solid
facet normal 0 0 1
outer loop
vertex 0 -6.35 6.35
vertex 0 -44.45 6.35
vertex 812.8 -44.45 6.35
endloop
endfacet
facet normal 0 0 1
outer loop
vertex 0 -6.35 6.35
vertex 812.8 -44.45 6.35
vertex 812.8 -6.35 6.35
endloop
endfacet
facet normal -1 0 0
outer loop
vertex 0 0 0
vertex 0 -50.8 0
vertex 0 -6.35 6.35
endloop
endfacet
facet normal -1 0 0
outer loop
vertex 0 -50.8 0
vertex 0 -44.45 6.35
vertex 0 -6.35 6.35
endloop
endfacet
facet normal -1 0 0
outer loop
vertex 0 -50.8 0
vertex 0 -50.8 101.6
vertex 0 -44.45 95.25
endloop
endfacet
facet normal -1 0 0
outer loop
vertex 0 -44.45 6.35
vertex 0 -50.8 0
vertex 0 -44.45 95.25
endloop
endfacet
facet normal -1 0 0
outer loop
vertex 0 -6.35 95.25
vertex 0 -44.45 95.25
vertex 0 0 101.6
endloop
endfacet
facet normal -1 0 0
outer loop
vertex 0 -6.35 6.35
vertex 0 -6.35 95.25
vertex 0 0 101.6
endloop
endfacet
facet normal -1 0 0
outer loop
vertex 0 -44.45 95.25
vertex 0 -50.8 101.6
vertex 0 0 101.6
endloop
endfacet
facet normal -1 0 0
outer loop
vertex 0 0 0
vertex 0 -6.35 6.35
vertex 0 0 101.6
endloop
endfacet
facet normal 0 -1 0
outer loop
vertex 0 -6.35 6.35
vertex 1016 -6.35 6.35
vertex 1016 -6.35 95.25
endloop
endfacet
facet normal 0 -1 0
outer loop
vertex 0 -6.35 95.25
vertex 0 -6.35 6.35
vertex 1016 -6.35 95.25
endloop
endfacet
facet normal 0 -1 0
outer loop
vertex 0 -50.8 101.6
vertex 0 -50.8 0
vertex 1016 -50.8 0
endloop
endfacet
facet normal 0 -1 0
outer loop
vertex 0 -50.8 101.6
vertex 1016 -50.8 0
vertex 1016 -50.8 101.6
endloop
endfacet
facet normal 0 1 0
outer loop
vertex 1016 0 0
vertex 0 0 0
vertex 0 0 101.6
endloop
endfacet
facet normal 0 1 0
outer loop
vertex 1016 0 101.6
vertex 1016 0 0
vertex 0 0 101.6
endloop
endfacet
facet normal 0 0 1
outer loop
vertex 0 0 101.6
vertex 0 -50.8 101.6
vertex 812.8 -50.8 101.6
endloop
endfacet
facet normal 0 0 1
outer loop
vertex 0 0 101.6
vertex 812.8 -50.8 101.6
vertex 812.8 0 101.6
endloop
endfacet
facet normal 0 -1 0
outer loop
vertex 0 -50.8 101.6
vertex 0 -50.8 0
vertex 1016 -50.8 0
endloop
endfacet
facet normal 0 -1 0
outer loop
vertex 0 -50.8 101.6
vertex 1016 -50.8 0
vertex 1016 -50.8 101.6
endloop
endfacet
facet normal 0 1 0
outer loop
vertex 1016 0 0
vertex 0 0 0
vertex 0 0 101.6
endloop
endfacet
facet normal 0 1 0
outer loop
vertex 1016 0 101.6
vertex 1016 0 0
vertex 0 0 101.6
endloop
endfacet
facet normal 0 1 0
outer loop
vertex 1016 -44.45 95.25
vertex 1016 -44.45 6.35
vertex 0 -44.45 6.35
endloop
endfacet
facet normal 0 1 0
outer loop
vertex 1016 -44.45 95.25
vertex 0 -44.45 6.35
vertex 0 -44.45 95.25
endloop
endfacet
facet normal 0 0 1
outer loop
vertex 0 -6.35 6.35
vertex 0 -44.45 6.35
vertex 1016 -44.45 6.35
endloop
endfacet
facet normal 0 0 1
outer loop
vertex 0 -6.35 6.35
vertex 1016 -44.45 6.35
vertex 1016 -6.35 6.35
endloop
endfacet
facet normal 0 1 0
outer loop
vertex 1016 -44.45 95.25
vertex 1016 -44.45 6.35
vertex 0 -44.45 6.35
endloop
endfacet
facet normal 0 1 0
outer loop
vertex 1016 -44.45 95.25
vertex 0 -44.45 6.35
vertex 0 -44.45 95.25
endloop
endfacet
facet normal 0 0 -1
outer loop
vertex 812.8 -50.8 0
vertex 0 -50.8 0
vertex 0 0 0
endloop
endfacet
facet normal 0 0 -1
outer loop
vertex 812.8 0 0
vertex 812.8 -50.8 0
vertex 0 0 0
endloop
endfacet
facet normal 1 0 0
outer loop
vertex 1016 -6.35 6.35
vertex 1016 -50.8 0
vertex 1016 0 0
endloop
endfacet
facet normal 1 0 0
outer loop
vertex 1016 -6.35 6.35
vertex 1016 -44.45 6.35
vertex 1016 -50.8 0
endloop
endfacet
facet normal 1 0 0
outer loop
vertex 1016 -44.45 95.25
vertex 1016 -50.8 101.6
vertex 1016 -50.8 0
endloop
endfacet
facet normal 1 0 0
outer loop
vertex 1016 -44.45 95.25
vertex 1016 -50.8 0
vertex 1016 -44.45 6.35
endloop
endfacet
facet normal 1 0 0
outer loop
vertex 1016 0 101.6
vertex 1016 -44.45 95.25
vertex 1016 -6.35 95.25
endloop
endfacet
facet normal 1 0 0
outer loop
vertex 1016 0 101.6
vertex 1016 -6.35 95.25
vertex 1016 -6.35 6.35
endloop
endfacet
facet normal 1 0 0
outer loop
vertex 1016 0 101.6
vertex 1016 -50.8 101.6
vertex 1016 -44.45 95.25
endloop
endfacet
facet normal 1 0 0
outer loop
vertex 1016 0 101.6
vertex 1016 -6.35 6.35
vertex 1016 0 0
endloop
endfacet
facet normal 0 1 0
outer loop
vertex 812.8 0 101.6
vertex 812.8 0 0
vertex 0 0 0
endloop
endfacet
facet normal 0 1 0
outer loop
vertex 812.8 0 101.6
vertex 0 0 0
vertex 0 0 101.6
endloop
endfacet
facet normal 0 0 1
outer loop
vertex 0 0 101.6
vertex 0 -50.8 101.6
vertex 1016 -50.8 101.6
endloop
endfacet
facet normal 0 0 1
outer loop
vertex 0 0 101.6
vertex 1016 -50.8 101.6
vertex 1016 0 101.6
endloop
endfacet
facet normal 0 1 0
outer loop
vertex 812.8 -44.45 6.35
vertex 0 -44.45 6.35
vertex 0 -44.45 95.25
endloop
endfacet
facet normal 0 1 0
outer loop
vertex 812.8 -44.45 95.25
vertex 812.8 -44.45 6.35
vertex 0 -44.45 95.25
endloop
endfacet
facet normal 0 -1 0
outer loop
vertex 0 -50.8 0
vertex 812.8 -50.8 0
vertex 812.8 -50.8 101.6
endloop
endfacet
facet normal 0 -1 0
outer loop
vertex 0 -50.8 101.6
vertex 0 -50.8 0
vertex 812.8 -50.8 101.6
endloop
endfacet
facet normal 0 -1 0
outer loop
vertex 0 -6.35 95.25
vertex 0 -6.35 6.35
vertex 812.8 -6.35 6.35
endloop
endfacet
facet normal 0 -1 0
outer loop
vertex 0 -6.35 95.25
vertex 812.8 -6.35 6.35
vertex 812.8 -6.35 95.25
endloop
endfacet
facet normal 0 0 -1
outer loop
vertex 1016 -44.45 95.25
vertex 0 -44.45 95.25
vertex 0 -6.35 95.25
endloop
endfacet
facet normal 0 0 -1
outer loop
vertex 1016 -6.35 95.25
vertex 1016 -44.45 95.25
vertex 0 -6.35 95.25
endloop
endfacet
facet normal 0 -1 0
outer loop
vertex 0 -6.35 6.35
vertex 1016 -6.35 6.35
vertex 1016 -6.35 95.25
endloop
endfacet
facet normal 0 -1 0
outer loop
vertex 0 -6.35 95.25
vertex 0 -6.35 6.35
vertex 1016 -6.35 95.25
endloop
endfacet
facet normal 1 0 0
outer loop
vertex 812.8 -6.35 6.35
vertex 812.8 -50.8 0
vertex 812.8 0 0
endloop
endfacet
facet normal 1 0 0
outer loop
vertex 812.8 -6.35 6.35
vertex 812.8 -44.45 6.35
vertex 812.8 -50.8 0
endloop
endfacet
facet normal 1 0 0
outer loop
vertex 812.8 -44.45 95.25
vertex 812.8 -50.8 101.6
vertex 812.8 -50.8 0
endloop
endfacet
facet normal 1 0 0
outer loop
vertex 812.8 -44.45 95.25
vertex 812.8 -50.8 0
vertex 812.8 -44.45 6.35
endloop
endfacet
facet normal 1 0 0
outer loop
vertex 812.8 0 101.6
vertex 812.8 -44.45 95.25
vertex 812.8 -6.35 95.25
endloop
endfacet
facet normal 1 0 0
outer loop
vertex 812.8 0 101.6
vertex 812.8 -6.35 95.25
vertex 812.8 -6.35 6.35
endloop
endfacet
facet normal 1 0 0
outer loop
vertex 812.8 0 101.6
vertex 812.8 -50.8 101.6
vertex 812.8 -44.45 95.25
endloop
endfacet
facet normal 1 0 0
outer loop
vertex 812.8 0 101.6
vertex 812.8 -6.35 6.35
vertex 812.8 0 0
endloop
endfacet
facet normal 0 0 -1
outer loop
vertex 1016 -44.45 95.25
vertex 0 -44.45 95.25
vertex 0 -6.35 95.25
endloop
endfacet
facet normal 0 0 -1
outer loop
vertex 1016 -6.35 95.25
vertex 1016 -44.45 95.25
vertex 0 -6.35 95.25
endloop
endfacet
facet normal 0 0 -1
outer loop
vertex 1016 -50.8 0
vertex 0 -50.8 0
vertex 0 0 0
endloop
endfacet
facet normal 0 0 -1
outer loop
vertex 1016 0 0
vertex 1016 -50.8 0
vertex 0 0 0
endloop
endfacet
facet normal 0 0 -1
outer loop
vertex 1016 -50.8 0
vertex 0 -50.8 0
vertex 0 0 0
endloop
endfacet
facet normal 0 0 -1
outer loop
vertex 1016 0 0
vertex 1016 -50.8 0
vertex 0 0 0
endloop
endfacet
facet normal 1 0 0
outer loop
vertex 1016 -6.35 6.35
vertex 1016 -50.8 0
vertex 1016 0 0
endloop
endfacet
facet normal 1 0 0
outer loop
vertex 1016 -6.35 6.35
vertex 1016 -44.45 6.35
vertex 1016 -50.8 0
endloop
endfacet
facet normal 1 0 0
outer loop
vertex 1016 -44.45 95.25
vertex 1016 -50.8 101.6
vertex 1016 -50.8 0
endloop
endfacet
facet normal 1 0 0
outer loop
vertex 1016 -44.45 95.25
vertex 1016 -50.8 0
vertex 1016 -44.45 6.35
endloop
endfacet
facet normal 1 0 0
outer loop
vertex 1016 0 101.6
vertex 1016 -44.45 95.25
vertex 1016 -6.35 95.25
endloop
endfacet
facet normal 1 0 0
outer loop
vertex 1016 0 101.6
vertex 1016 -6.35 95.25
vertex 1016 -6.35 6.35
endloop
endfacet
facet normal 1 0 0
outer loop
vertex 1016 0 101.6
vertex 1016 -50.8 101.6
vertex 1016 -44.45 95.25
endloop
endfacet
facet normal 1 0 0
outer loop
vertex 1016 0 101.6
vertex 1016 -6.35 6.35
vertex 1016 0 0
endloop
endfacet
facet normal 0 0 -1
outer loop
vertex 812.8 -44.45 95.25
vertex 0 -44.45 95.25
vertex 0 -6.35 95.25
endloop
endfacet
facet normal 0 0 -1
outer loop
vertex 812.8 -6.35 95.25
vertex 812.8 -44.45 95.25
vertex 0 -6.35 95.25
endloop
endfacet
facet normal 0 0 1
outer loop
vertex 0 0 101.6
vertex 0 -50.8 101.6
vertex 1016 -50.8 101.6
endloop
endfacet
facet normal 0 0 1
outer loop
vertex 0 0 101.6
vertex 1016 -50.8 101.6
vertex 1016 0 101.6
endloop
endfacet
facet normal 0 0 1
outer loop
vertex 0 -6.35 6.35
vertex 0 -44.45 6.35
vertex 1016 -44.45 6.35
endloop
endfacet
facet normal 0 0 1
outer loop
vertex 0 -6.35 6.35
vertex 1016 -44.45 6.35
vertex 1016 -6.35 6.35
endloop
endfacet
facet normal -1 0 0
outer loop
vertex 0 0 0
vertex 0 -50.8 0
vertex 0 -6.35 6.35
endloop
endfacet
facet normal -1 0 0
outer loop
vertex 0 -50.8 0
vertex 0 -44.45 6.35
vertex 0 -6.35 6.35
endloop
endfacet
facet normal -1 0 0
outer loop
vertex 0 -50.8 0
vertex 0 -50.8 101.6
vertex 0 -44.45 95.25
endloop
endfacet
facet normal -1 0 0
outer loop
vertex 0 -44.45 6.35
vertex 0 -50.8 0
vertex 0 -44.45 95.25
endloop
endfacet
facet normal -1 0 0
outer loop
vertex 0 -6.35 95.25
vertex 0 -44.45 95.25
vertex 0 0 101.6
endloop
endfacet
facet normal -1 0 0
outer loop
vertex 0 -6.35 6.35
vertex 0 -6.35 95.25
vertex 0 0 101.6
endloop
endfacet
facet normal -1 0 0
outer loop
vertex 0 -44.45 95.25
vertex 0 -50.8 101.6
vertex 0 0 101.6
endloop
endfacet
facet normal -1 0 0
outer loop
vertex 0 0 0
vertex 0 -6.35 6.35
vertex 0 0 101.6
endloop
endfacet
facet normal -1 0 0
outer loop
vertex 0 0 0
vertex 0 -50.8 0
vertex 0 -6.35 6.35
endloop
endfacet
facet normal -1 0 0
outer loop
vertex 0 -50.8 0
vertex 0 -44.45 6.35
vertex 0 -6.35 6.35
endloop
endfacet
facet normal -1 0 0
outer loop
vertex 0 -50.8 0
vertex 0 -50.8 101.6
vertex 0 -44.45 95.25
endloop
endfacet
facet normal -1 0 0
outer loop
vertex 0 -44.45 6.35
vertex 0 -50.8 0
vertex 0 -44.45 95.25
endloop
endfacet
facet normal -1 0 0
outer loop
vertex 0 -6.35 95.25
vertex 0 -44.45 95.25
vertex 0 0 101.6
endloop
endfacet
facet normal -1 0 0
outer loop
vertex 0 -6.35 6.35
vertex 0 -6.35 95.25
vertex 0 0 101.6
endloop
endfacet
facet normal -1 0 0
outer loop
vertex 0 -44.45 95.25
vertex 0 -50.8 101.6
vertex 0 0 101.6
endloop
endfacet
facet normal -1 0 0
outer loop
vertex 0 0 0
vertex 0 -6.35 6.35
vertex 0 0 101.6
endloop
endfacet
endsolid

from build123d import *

# Parameters (mm, degrees)
F0_W     = 50.8
F0_H     = 101.6
F0_W_2   = 38.1
F0_H_2   = 88.9
F1_DEPTH = 812.8
F2_DEPTH = 1016
F3_DEPTH = 1016


with BuildPart() as f1:
    # F0 (on Right) → F1 (new body)
    with BuildSketch(Plane.YZ):
        with Locations((-25.4, 50.8)):
            Rectangle(F0_W, F0_H)
        with Locations((-25.4, 50.8)):
            Rectangle(F0_W_2, F0_H_2, mode=Mode.SUBTRACT)
    extrude(amount=F1_DEPTH)


with BuildPart() as f2:
    # F0 (on Right) → F2 (new body)
    with BuildSketch(Plane.YZ):
        with Locations((-25.4, 50.8)):
            Rectangle(F0_W, F0_H)
        with Locations((-25.4, 50.8)):
            Rectangle(F0_W_2, F0_H_2, mode=Mode.SUBTRACT)
    extrude(amount=F2_DEPTH)


with BuildPart() as f3:
    # F0 (on Right) → F3 (new body)
    with BuildSketch(Plane.YZ):
        with Locations((-25.4, 50.8)):
            Rectangle(F0_W, F0_H)
        with Locations((-25.4, 50.8)):
            Rectangle(F0_W_2, F0_H_2, mode=Mode.SUBTRACT)
    extrude(amount=F3_DEPTH)


solid = Compound([f1.part, f2.part, f3.part])
